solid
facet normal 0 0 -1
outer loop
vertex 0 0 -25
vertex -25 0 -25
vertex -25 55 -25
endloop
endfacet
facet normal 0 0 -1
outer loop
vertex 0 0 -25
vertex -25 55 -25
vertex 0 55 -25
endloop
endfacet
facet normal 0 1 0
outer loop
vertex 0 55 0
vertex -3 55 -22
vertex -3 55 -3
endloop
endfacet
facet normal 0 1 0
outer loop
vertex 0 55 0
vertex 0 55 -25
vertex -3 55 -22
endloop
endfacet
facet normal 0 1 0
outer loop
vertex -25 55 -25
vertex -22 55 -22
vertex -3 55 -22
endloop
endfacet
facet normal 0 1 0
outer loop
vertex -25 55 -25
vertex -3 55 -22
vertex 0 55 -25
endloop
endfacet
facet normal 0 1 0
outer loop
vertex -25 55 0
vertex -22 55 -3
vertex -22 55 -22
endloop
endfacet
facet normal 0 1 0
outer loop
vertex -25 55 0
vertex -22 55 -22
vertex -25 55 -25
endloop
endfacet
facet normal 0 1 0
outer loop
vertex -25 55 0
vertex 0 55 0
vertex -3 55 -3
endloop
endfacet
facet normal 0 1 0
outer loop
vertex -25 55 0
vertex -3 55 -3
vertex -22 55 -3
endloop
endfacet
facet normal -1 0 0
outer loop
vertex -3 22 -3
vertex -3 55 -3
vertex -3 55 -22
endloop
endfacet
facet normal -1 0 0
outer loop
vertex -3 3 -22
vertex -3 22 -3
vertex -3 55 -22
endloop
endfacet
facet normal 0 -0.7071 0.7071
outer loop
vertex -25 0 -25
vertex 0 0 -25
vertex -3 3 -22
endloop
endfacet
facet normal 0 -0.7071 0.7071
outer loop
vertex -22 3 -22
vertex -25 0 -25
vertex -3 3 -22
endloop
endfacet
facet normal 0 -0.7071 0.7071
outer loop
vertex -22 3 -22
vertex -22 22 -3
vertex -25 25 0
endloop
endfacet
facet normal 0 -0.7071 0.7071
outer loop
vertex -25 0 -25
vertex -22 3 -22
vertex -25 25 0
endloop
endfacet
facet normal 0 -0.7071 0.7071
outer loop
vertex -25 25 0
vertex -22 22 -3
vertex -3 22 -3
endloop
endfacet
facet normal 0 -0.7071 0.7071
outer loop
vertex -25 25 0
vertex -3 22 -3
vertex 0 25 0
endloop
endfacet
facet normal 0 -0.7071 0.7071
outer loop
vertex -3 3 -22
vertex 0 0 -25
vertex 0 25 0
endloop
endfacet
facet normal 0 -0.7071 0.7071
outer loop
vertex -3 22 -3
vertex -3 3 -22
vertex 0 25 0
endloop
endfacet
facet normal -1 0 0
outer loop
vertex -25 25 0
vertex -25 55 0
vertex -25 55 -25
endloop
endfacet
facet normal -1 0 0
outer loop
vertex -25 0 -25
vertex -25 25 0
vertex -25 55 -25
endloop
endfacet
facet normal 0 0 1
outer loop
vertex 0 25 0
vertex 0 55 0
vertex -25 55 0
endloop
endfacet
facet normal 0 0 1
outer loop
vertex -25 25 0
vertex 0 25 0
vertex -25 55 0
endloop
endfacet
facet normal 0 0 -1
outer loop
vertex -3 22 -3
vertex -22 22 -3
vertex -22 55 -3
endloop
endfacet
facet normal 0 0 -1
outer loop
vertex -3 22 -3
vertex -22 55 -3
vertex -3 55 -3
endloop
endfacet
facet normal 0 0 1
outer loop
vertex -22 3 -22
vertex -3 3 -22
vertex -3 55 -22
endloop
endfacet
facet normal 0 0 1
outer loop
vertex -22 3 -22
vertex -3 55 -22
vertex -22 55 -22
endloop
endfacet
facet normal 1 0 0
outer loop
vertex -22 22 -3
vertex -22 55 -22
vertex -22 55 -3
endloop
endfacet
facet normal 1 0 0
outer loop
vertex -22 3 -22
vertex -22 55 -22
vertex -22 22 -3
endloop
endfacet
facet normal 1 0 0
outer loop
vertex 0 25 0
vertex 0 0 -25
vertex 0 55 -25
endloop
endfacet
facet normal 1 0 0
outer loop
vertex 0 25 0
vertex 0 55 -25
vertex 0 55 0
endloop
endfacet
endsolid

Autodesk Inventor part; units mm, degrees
ref_plane "YZ Plane" through (0, 0, 0) normal (1, 0, 0) x (0, 1, 0)
ref_plane "XZ Plane" through (0, 0, 0) normal (0, 1, 0) x (-1, 0, 0)
ref_plane "XY Plane" through (0, 0, 0) normal (0, 0, 1) x (1, 0, 0)
sketch "Sketch1" plane through (0, 0, 0) normal (0, 1, 0) x (-1, 0, 0)
  line L0 (0, 0) -> (25, 0)
  line L1 (25, 0) -> (25, -25)
  line L2 (25, -25) -> (0, -25)
  line L3 (0, -25) -> (0, 0)
  line L4 (22, -22) -> (22, -3)
  line L5 (22, -3) -> (3, -3)
  line L6 (3, -3) -> (3, -22)
  line L7 (3, -22) -> (22, -22)
  dimension "d0" = 25
  dimension "d1" = 25
  dimension "d2" = 3
extrude "Extrusion1" add sketch "Sketch1" along normal blind 55
sketch "Sketch2" plane through (0, 0, 0) normal (1, 0, 0) x (0, 0, -1)
  line L0 (0, 0) -> (25, 0) projected
  line L1 (25, 0) -> (25, 55) projected
  line L2 (0, 55) -> (25, 55) projected
  line L3 (0, 0) -> (0, 55) projected
  line L4 (25, 0) -> (25, 55) projected
  line L5 (25, 0) -> (0, 25)
  line L6 (0, 0) -> (0, 55) projected
  dimension "d5" = 45
extrude "Extrusion2" cut sketch "Sketch2" against normal blind 55 contours L3 L5 L0
properties part number "P410" material "Aluminum 6061"
